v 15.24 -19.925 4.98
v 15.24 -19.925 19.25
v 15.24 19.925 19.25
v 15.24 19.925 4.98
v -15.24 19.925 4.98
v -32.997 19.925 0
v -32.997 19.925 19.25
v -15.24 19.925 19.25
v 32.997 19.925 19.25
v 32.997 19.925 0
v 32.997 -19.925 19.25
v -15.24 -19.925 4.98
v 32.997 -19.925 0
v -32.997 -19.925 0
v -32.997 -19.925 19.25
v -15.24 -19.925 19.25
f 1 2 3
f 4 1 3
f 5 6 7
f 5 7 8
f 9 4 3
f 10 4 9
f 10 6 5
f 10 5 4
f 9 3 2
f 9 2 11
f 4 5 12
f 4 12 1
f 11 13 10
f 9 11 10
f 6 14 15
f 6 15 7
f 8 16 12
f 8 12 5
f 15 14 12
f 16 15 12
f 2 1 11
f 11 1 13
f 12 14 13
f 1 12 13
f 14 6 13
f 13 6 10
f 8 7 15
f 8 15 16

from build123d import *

# Parameters (mm, degrees)
SKETCH1_W           = 65.99377092
SKETCH1_H           = 39.85
BOSS_EXTRUDE1_DEPTH = 20
SKETCH2_W           = 30.48
SKETCH2_H           = 39.85
CUT_EXTRUDE1_DEPTH  = 15.02
SKETCH3_W           = 65.99377092
SKETCH3_H           = 39.85
CUT_EXTRUDE2_DEPTH  = 0.75


with BuildPart() as part:
    # Sketch1 → Boss-Extrude1 (new body)
    with BuildSketch(Plane.XY):
        Rectangle(SKETCH1_W, SKETCH1_H)
    extrude(amount=BOSS_EXTRUDE1_DEPTH)

    # Sketch2 → Cut-Extrude1 (cut)
    with BuildSketch(Plane.XY.offset(20)):
        Rectangle(SKETCH2_W, SKETCH2_H)
    extrude(amount=-CUT_EXTRUDE1_DEPTH, mode=Mode.SUBTRACT)

    # Sketch3 → Cut-Extrude2 (cut)
    with BuildSketch(Plane.XY.offset(20)):
        Rectangle(SKETCH3_W, SKETCH3_H)
    extrude(amount=-CUT_EXTRUDE2_DEPTH, mode=Mode.SUBTRACT)


solid = part.part
